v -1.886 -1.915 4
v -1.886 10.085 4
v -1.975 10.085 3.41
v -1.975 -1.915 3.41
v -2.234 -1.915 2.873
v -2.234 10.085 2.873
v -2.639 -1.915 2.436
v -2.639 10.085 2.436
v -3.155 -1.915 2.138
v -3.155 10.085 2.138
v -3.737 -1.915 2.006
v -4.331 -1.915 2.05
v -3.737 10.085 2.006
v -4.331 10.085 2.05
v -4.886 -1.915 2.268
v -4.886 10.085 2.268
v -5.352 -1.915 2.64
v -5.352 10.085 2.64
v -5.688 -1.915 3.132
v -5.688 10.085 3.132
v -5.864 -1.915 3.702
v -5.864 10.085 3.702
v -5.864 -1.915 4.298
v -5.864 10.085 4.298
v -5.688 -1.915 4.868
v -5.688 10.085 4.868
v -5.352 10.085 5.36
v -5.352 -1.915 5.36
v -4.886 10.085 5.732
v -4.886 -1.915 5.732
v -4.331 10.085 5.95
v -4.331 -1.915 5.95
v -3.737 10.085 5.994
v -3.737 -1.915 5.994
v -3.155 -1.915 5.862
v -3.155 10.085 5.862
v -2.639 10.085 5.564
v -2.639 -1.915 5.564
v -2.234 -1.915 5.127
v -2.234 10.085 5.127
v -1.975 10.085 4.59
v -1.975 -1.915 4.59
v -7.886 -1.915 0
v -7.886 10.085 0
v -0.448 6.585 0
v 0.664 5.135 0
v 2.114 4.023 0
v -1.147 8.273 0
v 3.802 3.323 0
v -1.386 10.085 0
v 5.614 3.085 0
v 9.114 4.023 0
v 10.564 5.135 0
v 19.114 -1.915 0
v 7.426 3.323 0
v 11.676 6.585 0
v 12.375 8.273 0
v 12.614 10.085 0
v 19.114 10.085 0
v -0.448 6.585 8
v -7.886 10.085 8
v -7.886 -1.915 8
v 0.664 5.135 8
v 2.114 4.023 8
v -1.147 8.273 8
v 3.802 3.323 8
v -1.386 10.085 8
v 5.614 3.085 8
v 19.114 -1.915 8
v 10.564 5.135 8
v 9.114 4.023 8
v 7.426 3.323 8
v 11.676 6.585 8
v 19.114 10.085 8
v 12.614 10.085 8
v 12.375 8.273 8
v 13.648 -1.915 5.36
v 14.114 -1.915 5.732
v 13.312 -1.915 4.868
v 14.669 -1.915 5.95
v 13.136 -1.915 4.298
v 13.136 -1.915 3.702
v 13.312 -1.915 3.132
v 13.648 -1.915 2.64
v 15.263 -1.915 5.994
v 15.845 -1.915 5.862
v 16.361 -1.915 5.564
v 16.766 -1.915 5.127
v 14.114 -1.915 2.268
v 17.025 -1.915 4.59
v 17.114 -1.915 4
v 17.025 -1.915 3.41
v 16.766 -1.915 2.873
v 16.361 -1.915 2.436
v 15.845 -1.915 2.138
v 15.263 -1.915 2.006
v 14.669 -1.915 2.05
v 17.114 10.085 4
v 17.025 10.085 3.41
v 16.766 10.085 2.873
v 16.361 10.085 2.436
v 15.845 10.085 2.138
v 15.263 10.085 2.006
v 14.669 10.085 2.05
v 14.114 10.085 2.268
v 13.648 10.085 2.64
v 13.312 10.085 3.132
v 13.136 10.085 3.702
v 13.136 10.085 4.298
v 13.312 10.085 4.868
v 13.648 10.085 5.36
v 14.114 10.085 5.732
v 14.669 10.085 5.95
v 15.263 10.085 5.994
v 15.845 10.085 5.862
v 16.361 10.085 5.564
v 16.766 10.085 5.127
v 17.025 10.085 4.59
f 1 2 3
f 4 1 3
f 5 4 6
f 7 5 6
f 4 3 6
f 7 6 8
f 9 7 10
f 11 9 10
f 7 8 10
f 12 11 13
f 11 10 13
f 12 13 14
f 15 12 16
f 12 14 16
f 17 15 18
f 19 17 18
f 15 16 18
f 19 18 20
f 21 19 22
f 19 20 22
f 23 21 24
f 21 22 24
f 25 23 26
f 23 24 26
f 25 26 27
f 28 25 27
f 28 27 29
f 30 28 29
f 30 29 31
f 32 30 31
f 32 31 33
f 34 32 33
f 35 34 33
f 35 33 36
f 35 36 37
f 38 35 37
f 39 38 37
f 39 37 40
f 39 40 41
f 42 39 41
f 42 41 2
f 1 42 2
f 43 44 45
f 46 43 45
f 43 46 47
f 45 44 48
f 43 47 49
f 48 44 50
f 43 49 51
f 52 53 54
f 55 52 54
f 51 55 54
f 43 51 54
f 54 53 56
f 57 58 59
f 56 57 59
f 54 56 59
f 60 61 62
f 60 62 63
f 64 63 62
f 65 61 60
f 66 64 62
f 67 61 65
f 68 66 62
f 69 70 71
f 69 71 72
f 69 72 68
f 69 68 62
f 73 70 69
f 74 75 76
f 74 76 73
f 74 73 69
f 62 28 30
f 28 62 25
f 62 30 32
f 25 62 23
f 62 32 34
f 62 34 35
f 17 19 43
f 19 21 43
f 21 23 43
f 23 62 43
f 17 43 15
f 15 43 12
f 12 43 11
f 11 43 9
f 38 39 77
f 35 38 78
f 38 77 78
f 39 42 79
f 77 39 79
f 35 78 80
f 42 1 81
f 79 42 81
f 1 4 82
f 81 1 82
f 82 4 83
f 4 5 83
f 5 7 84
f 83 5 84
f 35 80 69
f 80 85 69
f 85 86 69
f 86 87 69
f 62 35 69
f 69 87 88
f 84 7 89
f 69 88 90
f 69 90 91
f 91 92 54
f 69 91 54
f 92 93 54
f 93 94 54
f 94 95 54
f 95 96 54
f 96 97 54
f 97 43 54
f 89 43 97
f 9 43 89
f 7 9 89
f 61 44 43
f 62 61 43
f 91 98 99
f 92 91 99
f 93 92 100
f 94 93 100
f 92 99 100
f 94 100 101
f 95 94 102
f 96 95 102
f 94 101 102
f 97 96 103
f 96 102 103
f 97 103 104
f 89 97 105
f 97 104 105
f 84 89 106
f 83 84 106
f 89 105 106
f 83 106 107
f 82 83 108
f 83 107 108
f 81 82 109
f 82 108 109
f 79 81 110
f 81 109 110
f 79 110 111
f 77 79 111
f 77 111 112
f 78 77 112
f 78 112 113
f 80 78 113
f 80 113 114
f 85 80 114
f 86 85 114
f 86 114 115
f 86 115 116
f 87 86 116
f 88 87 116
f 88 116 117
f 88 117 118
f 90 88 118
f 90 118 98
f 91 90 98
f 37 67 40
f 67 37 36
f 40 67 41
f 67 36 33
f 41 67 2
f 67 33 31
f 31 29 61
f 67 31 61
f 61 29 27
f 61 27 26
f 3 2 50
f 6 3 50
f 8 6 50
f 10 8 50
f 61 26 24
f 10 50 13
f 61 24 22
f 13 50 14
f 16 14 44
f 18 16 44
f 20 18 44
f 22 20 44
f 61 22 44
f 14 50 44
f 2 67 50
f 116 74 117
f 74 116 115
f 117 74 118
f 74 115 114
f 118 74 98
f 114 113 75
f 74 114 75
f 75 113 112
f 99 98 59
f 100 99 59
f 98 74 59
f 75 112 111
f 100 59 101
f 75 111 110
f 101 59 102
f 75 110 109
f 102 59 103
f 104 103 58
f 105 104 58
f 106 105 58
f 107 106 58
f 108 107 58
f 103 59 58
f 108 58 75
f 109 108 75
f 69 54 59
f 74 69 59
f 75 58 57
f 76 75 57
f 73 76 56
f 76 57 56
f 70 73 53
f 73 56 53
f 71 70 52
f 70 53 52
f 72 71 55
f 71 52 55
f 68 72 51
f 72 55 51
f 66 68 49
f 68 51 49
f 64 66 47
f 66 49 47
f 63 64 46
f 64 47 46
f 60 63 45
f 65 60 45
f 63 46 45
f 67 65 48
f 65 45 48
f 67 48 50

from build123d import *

# Parameters (mm, degrees)
BOSS_EXTRUDE1_DEPTH = 8
SKETCH2_R           = 2
CUT_EXTRUDE1_DEPTH  = 13


with BuildPart() as part:
    # Sketch1 → Boss-Extrude1 (new body)
    with BuildSketch(Plane.XY):
        with BuildLine():
            Line((-7.885993485, 10.084690554), (-7.885993485, -1.915309446))
            Line((-7.885993485, -1.915309446), (19.114006515, -1.915309446))
            Line((19.114006515, -1.915309446), (19.114006515, 10.084690554))
            Line((19.114006515, 10.084690554), (12.614006515, 10.084690554))
            ThreePointArc((12.614006515, 10.084690554), (5.614006515, 3.084690554), (-1.385993485, 10.084690554))
            Line((-1.385993485, 10.084690554), (-7.885993485, 10.084690554))
        make_face()
    extrude(amount=BOSS_EXTRUDE1_DEPTH)

    # Sketch2 → Cut-Extrude1 (cut, through all)
    with BuildSketch(Plane(origin=(0, 10.084690554, 0), x_dir=(1, 0, 0), z_dir=(0, 1, 0))):
        with Locations((-3.885993485, -4)):
            Circle(SKETCH2_R)
        with Locations((15.114006515, -4)):
            Circle(SKETCH2_R)
    extrude(amount=-CUT_EXTRUDE1_DEPTH, mode=Mode.SUBTRACT)


solid = part.part
